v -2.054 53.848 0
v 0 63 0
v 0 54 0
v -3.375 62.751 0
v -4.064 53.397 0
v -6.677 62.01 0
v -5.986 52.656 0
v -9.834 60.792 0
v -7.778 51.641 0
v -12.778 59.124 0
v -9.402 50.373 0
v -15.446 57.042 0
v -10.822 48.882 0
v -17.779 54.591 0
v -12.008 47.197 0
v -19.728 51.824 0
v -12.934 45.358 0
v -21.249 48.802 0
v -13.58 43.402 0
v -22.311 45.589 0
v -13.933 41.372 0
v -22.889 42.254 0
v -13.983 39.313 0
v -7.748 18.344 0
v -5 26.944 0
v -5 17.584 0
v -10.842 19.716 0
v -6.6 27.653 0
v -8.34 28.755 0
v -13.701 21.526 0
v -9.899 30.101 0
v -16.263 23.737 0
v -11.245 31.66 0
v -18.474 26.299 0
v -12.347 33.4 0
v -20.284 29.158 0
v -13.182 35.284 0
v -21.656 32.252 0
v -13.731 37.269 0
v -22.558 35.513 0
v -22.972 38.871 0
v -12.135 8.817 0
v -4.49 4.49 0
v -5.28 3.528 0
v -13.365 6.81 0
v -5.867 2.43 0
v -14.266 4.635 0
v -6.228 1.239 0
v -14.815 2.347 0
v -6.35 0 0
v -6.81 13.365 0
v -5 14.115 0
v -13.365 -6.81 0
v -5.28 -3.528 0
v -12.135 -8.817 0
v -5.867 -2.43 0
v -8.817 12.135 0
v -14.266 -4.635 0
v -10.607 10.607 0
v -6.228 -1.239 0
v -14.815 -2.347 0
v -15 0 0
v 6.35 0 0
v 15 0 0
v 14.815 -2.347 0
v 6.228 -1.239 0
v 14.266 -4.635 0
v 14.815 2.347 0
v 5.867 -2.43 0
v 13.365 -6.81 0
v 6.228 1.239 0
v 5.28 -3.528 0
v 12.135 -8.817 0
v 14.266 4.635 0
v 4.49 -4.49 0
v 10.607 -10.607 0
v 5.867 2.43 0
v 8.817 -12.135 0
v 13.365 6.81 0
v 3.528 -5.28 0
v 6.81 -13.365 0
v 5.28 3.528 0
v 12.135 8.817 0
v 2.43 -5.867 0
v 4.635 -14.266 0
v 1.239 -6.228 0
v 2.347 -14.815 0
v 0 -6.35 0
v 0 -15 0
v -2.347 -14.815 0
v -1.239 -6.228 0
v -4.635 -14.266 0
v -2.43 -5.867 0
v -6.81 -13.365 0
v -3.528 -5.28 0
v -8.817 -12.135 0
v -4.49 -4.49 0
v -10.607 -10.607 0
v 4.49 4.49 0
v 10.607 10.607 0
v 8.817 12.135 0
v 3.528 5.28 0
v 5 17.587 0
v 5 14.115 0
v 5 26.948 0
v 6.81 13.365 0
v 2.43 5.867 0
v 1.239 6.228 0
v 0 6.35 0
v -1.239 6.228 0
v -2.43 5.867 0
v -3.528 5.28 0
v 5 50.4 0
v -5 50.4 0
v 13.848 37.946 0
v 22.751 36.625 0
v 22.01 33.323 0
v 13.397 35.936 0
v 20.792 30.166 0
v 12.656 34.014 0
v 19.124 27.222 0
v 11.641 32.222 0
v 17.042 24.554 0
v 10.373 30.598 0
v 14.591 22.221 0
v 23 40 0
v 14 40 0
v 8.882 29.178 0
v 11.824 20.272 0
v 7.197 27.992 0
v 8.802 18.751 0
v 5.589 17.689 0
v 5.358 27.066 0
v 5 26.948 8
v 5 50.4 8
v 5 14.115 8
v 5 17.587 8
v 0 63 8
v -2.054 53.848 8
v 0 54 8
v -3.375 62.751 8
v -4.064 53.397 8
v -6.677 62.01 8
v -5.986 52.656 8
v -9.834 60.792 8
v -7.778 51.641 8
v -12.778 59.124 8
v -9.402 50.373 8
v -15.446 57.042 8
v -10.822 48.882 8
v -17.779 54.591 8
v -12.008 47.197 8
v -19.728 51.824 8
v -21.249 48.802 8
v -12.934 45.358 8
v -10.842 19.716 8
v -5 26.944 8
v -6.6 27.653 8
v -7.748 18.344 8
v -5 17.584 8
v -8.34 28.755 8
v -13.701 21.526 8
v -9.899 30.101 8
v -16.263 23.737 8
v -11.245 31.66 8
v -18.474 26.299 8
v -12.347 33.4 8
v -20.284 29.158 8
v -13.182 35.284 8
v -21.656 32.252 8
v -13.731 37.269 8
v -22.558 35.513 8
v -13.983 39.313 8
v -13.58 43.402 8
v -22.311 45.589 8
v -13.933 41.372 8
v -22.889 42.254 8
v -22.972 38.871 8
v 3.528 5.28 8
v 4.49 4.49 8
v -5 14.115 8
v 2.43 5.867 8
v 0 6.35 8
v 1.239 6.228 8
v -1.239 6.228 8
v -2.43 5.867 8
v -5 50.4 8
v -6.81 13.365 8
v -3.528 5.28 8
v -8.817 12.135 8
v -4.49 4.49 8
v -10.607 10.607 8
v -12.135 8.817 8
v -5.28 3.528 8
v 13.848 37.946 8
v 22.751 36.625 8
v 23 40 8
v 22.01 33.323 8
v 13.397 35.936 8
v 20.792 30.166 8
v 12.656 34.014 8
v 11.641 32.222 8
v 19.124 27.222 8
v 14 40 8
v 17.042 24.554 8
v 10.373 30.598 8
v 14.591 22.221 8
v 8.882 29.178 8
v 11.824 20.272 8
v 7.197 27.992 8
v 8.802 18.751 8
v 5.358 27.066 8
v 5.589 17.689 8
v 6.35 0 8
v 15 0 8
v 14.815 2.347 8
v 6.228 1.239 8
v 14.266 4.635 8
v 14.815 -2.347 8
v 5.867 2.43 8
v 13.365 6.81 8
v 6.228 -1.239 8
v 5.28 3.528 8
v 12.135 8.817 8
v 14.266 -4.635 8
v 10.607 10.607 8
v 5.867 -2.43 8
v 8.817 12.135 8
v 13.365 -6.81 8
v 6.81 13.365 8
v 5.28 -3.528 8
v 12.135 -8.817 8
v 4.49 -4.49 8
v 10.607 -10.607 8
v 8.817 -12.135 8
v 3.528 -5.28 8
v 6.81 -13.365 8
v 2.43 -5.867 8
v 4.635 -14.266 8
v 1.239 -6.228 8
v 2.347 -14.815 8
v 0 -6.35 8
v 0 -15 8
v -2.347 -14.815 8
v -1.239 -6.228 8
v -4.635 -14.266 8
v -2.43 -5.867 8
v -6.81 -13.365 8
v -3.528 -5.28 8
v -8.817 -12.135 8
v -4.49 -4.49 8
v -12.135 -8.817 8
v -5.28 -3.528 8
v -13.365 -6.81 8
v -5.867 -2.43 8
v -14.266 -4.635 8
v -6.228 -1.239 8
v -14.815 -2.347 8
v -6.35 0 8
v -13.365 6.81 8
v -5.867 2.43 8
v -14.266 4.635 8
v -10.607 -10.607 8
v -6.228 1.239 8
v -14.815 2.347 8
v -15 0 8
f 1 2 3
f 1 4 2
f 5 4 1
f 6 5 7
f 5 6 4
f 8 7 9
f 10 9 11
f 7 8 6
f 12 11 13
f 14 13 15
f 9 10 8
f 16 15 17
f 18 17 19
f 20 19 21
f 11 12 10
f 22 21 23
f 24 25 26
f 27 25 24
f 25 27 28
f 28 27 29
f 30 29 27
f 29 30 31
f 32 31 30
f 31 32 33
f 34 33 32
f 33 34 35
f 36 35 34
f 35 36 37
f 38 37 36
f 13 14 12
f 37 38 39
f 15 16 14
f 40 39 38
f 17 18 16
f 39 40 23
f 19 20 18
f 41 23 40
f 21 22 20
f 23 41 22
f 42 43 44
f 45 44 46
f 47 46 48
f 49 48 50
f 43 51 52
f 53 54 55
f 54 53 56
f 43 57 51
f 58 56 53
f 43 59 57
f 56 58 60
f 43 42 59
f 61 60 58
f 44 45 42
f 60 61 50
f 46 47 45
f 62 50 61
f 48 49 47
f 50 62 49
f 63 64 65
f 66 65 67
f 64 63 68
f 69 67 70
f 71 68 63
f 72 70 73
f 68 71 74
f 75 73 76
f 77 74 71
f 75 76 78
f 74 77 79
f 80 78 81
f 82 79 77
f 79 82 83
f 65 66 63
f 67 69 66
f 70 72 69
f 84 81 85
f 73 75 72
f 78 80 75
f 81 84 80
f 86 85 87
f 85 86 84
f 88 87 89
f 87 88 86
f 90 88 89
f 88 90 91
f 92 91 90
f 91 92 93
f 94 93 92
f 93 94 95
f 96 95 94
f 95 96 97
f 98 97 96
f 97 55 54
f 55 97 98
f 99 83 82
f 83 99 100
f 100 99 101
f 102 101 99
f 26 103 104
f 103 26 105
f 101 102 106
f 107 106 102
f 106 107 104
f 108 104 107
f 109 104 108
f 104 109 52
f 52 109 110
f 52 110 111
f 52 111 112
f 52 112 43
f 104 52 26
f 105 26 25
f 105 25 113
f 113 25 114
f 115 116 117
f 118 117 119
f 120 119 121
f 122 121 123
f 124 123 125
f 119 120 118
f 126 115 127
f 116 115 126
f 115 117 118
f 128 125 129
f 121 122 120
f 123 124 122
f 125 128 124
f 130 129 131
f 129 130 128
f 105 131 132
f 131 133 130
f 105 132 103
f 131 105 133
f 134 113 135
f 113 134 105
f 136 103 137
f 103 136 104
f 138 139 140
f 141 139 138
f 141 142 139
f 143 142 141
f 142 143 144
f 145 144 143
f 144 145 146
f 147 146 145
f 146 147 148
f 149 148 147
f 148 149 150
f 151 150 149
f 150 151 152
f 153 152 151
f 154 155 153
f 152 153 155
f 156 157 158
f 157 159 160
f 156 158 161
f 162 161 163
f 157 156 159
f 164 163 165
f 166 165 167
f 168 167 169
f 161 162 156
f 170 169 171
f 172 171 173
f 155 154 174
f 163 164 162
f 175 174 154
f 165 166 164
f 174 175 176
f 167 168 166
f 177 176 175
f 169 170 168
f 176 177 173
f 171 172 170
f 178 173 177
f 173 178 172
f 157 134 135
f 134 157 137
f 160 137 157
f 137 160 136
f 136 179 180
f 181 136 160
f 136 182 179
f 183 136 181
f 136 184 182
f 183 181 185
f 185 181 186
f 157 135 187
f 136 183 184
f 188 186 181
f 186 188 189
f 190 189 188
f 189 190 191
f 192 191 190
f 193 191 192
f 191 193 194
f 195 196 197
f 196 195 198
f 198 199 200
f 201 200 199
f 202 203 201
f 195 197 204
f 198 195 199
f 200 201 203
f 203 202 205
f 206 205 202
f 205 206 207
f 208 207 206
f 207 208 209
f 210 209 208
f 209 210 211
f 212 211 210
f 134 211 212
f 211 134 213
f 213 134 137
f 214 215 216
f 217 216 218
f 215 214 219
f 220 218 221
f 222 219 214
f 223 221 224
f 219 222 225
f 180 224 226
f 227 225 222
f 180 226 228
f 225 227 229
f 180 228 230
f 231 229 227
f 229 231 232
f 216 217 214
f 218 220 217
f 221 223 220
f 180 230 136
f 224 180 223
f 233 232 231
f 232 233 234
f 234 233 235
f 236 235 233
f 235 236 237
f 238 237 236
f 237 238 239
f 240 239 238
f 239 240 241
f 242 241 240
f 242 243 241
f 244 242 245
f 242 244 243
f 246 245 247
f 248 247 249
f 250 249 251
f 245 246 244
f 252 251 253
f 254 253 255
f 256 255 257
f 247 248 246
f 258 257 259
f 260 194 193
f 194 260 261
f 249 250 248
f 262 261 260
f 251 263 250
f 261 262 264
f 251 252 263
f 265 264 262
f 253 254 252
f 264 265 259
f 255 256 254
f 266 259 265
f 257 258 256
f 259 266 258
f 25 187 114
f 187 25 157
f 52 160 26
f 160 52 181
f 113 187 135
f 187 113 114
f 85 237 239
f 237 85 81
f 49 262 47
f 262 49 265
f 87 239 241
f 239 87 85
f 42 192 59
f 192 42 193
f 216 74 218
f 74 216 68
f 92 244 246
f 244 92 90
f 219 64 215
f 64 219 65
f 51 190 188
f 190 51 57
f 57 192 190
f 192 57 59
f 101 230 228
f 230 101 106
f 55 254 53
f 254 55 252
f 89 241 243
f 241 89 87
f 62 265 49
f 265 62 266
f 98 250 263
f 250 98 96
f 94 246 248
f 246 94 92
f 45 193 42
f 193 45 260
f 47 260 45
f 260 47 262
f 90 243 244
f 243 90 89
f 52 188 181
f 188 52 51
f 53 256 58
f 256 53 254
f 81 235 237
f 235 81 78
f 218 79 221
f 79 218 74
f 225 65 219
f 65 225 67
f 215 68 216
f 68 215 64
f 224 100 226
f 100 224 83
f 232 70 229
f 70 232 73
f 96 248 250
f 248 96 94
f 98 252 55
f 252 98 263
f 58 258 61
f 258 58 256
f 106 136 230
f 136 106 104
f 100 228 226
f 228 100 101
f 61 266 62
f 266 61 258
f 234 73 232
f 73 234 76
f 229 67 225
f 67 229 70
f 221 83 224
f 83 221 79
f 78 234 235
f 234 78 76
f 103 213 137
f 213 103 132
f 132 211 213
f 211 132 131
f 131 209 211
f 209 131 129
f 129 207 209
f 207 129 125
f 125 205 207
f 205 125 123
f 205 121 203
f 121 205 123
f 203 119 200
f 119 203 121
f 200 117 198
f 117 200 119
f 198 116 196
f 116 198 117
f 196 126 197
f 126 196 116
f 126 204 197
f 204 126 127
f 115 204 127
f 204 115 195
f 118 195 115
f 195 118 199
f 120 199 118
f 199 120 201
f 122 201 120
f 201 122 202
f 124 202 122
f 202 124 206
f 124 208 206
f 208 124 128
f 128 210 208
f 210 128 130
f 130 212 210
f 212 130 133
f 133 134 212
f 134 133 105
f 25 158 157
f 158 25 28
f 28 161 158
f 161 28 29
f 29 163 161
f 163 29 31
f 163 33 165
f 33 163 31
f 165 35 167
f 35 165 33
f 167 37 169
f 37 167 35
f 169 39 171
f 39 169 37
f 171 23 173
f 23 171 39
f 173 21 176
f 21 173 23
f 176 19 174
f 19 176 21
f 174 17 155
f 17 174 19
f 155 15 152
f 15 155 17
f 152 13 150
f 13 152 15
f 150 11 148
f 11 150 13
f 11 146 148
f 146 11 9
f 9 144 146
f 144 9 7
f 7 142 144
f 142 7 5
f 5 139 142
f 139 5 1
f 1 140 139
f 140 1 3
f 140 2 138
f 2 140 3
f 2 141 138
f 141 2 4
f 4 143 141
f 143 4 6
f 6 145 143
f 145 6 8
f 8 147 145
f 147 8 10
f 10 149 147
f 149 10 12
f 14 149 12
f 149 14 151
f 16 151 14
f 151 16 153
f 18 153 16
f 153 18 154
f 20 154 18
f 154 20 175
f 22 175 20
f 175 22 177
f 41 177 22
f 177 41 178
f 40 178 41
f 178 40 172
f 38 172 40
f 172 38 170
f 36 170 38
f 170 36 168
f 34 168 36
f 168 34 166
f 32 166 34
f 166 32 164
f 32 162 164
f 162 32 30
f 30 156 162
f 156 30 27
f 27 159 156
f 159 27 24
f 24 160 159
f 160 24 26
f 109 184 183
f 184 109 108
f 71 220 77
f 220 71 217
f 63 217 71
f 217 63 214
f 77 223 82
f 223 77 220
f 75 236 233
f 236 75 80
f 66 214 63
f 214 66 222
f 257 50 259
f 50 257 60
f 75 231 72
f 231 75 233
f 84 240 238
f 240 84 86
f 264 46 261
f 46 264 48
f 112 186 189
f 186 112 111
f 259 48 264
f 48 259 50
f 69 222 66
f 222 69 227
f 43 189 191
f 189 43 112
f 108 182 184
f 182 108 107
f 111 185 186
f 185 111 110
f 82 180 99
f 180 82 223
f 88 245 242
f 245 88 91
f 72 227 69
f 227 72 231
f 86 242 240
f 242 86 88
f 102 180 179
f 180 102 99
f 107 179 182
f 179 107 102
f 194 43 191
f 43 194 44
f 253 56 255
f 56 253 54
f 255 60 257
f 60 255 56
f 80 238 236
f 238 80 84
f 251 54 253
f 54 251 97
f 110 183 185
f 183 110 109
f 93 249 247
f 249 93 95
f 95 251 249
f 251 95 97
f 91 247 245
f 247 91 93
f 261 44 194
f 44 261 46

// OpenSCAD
$fn = 32;

// ----------------------------------------------------------------------
// Hook: 80 mm shank into a 14 mm curl, 8 mm thick
// ----------------------------------------------------------------------

// --- parameters (mm) ---
shank_len = 80;           // shank length from the boss centre
shank_w = 10;             // shank width
boss_d = 30;              // boss diameter
bore_d = 12.7;            // boss bore
curl_in = 14;             // curl inner radius
curl_out = 23;            // curl outer radius
curl_sweep = 270;         // curl sweep angle
hook_t = 8;               // hook thickness

shank_profile = [[-5, 50.4], [5, 50.4], [5, 13], [-5, 13]];
boss_profile = [[15, 0], [14.815, 2.347], [14.266, 4.635], [13.365, 6.81], [12.135, 8.817], [10.607, 10.607], [8.817, 12.135], [6.81, 13.365], [4.635, 14.266], [2.347, 14.815], [0, 15], [-2.347, 14.815], [-4.635, 14.266], [-6.81, 13.365], [-8.817, 12.135], [-10.607, 10.607], [-12.135, 8.817], [-13.365, 6.81], [-14.266, 4.635], [-14.815, 2.347], [-15, 0], [-14.815, -2.347], [-14.266, -4.635], [-13.365, -6.81], [-12.135, -8.817], [-10.607, -10.607], [-8.817, -12.135], [-6.81, -13.365], [-4.635, -14.266], [-2.347, -14.815], [0, -15], [2.347, -14.815], [4.635, -14.266], [6.81, -13.365], [8.817, -12.135], [10.607, -10.607], [12.135, -8.817], [13.365, -6.81], [14.266, -4.635], [14.815, -2.347]];
curl_profile = [[0, 63], [-3.375, 62.751], [-6.677, 62.01], [-9.834, 60.792], [-12.778, 59.124], [-15.446, 57.042], [-17.779, 54.591], [-19.728, 51.824], [-21.249, 48.802], [-22.311, 45.589], [-22.889, 42.254], [-22.972, 38.871], [-22.558, 35.513], [-21.656, 32.252], [-20.284, 29.158], [-18.474, 26.299], [-16.263, 23.737], [-13.701, 21.526], [-10.842, 19.716], [-7.748, 18.344], [-4.487, 17.442], [-1.129, 17.028], [2.254, 17.111], [5.589, 17.689], [8.802, 18.751], [11.824, 20.272], [14.591, 22.221], [17.042, 24.554], [19.124, 27.222], [20.792, 30.166], [22.01, 33.323], [22.751, 36.625], [23, 40], [14, 40], [13.848, 37.946], [13.397, 35.936], [12.656, 34.014], [11.641, 32.222], [10.373, 30.598], [8.882, 29.178], [7.197, 27.992], [5.358, 27.066], [3.402, 26.42], [1.372, 26.067], [-0.687, 26.017], [-2.731, 26.269], [-4.716, 26.818], [-6.6, 27.653], [-8.34, 28.755], [-9.899, 30.101], [-11.245, 31.66], [-12.347, 33.4], [-13.182, 35.284], [-13.731, 37.269], [-13.983, 39.313], [-13.933, 41.372], [-13.58, 43.402], [-12.934, 45.358], [-12.008, 47.197], [-10.822, 48.882], [-9.402, 50.373], [-7.778, 51.641], [-5.986, 52.656], [-4.064, 53.397], [-2.054, 53.848], [0, 54]];

difference() {
  union() {
    /* three overlapping outlines: shank, boss and the smooth curl */
    linear_extrude(height = hook_t) polygon(shank_profile);
    linear_extrude(height = hook_t) polygon(boss_profile);
    linear_extrude(height = hook_t) polygon(curl_profile);
  }
  translate([0, 0, -2.5]) cylinder(h = hook_t + 5, d = bore_d);
}
